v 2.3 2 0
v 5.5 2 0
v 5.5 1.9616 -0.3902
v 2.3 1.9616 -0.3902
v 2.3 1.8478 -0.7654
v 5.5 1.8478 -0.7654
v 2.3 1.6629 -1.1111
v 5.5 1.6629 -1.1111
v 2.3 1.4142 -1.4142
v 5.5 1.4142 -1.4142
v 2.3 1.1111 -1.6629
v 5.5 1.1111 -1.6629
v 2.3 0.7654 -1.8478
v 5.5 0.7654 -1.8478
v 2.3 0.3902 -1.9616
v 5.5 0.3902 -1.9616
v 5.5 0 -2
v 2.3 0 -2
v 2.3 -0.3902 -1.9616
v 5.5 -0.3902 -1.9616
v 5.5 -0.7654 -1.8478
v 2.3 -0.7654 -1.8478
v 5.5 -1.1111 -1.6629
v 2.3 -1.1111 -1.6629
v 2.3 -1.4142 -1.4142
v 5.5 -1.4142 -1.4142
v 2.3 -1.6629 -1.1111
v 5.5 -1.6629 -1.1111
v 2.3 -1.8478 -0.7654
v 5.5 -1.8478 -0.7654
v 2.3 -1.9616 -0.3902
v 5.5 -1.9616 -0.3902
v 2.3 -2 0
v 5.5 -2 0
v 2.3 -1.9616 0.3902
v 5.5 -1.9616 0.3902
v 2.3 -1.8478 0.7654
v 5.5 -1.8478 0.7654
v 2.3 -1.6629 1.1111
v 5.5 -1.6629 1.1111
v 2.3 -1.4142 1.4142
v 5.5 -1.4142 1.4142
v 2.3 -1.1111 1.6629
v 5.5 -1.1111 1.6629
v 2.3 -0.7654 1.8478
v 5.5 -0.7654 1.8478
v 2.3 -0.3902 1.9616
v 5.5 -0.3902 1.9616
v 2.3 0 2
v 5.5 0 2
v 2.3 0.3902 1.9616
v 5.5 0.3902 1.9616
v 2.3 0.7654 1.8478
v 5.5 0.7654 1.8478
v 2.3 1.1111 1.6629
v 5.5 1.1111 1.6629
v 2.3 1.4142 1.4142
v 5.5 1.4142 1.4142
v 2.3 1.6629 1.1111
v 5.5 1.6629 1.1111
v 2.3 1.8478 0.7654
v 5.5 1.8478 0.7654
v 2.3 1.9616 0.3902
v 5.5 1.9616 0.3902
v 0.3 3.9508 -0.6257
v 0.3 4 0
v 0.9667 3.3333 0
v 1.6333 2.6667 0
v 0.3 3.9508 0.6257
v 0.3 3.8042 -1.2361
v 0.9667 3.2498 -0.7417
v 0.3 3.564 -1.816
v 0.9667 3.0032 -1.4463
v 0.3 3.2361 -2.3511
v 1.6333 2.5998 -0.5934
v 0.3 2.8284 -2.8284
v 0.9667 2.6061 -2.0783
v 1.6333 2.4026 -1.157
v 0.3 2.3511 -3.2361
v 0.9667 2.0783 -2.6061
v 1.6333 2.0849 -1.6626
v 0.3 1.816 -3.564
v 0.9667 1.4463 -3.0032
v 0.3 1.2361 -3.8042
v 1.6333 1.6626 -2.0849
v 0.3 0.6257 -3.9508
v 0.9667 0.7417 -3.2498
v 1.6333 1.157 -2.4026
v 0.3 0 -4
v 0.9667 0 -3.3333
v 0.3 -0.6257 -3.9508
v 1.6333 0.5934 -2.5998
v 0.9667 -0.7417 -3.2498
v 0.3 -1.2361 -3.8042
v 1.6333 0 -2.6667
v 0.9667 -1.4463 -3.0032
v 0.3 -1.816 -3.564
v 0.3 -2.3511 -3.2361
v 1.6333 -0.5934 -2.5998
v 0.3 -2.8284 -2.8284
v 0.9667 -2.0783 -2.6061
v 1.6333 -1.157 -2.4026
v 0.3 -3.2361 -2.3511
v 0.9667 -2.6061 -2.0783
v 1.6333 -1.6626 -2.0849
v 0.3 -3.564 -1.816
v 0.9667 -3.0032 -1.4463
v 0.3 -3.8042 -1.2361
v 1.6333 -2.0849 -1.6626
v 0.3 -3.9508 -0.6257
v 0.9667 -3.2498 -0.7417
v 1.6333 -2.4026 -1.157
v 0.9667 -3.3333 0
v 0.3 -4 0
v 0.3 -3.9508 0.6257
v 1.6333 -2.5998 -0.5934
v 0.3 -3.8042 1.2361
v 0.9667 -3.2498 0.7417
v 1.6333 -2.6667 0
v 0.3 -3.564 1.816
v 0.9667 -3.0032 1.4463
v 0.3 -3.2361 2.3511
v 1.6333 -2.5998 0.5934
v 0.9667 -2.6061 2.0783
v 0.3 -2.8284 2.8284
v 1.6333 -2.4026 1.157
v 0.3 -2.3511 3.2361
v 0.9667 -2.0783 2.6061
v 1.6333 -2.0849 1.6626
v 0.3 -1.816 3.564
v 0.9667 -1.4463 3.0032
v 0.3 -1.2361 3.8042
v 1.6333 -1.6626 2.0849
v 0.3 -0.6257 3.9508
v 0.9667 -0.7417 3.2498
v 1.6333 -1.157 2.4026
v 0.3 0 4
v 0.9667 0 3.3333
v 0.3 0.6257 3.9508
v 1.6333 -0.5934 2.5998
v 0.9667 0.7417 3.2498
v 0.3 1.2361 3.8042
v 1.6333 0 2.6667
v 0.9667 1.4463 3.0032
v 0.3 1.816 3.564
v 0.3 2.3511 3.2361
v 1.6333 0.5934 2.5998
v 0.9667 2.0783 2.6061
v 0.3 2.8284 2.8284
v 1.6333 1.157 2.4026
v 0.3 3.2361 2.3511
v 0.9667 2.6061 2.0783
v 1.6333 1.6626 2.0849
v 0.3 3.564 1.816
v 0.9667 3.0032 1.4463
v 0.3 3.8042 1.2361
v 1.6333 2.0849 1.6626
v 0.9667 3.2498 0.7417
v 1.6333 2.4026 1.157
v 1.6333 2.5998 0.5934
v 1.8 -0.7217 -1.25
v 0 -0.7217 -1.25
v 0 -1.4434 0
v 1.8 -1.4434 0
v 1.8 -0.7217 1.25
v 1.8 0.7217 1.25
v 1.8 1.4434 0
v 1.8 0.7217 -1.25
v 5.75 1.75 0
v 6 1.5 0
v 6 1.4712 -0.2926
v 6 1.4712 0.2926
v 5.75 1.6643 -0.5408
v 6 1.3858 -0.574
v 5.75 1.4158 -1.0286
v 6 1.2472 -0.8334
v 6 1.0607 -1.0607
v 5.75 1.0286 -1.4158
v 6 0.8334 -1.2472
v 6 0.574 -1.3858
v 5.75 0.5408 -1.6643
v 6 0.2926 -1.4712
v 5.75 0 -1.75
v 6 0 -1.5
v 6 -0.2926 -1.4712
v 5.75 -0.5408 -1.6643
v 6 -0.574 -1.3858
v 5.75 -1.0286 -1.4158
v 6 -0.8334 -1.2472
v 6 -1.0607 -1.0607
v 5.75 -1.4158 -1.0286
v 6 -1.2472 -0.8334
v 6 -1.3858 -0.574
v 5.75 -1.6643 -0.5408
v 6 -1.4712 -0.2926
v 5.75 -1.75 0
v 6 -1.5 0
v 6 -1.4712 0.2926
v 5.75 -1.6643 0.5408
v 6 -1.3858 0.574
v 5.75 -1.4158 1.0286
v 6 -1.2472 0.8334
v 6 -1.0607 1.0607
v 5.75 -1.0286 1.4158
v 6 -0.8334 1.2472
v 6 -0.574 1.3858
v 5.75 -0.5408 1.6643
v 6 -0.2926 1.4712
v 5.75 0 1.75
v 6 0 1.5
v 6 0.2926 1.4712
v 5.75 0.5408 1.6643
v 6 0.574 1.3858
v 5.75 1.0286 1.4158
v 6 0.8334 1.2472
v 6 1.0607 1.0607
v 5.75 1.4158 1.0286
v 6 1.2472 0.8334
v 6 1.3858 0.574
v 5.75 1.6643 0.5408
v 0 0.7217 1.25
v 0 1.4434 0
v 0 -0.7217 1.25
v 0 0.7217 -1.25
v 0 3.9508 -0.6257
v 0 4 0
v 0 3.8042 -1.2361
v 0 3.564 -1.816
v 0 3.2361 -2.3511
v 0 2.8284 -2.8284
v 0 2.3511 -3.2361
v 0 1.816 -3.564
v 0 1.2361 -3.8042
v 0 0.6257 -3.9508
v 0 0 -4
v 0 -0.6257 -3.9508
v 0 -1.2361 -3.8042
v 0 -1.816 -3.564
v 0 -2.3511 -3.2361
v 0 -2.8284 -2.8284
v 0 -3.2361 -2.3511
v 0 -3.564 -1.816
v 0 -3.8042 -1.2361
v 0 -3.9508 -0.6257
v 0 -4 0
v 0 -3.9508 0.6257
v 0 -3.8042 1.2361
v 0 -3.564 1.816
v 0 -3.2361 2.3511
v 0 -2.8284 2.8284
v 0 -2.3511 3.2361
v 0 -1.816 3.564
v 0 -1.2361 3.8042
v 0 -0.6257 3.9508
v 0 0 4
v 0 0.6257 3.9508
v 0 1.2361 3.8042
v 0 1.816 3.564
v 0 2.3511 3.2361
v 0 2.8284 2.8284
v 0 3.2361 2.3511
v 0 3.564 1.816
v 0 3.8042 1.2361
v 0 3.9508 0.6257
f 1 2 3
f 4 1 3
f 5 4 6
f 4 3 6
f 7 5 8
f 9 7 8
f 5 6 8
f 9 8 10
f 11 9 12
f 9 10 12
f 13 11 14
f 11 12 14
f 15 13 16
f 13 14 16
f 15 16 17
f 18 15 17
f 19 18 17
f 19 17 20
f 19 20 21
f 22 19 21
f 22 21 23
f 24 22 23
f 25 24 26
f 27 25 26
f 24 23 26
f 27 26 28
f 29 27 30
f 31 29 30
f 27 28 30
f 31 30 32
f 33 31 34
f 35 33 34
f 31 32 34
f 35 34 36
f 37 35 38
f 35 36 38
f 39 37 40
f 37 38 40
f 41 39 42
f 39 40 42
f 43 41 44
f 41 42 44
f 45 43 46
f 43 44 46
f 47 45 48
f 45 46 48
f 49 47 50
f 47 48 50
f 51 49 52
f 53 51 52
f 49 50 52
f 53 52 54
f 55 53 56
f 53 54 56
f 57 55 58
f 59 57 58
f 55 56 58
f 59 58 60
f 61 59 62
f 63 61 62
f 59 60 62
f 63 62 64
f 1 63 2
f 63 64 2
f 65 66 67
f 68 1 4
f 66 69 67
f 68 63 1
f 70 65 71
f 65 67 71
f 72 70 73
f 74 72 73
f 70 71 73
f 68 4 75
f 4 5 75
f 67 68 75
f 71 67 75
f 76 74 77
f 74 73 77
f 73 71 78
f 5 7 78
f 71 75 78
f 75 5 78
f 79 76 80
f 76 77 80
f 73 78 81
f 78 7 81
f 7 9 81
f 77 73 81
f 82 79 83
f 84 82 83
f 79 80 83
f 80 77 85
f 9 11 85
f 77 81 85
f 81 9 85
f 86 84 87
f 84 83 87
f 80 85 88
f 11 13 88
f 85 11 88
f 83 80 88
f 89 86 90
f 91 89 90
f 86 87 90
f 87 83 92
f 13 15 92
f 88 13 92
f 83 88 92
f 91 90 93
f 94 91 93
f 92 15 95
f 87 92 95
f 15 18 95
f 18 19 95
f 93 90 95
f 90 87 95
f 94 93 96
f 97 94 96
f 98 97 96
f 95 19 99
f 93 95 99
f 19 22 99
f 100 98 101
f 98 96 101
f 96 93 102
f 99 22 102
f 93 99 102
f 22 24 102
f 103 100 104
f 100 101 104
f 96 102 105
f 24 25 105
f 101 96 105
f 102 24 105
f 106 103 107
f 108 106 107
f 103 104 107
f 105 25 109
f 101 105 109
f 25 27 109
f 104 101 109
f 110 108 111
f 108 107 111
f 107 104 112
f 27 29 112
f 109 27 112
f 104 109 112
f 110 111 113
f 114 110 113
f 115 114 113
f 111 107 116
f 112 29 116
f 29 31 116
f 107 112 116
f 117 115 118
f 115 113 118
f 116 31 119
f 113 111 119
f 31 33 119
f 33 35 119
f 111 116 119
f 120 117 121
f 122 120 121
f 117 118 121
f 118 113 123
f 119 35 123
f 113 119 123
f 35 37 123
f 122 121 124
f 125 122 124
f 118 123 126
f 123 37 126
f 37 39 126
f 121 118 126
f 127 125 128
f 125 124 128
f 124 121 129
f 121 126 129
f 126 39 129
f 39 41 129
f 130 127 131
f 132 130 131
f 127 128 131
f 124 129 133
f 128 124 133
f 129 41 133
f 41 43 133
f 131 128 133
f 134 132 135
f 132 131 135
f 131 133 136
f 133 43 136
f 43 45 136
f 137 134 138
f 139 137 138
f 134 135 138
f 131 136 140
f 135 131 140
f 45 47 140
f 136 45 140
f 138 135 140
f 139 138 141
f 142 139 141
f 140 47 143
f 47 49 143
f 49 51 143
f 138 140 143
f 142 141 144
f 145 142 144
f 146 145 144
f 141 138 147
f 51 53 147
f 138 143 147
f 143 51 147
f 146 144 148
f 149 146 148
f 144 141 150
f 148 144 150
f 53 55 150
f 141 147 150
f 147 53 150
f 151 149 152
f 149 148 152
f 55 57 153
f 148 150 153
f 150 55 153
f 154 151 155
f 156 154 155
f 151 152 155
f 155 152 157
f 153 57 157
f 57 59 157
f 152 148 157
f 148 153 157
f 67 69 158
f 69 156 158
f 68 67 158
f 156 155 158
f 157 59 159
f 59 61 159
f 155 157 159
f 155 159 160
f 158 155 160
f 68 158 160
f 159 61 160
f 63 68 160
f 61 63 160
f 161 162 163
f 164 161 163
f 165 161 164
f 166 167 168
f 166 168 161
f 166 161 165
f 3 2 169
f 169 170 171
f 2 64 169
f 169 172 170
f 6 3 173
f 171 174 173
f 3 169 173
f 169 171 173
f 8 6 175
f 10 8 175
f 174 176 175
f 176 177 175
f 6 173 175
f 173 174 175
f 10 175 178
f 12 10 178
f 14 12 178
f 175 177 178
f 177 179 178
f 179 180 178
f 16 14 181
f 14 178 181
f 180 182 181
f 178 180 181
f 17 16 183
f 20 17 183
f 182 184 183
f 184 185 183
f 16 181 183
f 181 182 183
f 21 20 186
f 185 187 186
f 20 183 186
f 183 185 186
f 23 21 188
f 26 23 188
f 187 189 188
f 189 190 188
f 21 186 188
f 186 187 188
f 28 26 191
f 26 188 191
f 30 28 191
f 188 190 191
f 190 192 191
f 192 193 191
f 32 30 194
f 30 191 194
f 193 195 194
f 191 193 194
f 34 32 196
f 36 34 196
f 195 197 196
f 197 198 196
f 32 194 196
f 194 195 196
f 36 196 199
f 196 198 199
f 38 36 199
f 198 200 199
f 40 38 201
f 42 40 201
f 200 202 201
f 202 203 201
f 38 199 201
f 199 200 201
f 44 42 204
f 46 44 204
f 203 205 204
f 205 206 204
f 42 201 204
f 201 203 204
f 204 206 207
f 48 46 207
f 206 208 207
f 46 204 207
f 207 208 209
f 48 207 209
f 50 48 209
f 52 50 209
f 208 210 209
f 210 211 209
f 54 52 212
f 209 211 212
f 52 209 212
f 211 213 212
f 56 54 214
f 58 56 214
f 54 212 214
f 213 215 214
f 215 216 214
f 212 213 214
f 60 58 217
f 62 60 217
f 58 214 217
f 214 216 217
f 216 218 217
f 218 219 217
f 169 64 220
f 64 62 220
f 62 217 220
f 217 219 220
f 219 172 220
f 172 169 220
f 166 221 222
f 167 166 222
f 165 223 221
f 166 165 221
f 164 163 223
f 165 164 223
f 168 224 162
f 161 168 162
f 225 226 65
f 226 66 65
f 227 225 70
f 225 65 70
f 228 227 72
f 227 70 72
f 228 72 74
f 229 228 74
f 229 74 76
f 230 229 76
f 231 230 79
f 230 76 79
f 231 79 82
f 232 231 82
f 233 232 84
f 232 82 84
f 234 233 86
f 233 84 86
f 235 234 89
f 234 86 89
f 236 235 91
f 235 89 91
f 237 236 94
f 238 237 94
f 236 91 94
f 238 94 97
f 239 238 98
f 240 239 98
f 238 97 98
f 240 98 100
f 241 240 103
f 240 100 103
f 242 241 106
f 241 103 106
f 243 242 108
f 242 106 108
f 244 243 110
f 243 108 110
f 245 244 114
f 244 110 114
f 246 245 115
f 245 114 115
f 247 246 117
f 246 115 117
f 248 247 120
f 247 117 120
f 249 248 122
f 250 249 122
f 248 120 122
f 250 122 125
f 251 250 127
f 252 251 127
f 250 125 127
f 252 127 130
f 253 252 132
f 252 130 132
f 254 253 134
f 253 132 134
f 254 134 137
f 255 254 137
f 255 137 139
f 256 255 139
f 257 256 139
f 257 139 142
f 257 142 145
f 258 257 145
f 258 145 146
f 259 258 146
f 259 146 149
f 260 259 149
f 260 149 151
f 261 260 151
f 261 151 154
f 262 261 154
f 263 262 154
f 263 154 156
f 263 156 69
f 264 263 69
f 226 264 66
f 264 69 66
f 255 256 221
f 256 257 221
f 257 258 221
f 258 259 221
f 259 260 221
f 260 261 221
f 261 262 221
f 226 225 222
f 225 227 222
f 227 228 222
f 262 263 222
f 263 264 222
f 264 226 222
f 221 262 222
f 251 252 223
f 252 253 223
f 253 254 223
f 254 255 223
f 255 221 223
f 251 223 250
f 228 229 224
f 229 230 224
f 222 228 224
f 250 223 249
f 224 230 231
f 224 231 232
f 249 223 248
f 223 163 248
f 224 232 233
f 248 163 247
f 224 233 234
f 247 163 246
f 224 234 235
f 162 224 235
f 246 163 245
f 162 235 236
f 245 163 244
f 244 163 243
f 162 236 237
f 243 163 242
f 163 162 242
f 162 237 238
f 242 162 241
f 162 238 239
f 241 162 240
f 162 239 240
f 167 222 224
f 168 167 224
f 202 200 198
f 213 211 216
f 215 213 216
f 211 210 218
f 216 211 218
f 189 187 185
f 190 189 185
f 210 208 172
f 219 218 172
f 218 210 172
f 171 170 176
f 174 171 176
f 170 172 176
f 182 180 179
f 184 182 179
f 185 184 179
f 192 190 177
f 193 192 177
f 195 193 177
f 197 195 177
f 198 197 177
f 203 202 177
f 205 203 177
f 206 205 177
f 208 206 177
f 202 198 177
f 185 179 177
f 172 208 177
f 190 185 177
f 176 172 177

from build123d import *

# Parameters (mm, degrees)
CHANFREIN1_SIZE         = 0.5
ENL_V_MAT_EXTRU_1_DEPTH = 1.8


with BuildPart() as part:
    # Esquisse1 → Révolution1 (revolve)
    with BuildSketch(Plane.XY):
        Polygon((0, 0), (0, 4), (0.3, 4), (2.3, 2), (6, 2), (6, 0), align=None)
    revolve(axis=Axis((6, 0, 0), (-1, 0, 0)))

    # Chanfrein1
    chanfrein1_edges = [part.edges().sort_by_distance(p)[0] for p in [
        (6, -2, 0),
    ]]
    chamfer(chanfrein1_edges, length=CHANFREIN1_SIZE)

    # Esquisse2 → Enlèv. mat.-Extru.1 (cut)
    with BuildSketch(Plane.ZY):
        Polygon((0, 1.443375673), (-1.25, 0.721687836), (-1.25, -0.721687836), (0, -1.443375673), (1.25, -0.721687836), (1.25, 0.721687836), align=None)
    extrude(amount=-ENL_V_MAT_EXTRU_1_DEPTH, mode=Mode.SUBTRACT)


solid = part.part
